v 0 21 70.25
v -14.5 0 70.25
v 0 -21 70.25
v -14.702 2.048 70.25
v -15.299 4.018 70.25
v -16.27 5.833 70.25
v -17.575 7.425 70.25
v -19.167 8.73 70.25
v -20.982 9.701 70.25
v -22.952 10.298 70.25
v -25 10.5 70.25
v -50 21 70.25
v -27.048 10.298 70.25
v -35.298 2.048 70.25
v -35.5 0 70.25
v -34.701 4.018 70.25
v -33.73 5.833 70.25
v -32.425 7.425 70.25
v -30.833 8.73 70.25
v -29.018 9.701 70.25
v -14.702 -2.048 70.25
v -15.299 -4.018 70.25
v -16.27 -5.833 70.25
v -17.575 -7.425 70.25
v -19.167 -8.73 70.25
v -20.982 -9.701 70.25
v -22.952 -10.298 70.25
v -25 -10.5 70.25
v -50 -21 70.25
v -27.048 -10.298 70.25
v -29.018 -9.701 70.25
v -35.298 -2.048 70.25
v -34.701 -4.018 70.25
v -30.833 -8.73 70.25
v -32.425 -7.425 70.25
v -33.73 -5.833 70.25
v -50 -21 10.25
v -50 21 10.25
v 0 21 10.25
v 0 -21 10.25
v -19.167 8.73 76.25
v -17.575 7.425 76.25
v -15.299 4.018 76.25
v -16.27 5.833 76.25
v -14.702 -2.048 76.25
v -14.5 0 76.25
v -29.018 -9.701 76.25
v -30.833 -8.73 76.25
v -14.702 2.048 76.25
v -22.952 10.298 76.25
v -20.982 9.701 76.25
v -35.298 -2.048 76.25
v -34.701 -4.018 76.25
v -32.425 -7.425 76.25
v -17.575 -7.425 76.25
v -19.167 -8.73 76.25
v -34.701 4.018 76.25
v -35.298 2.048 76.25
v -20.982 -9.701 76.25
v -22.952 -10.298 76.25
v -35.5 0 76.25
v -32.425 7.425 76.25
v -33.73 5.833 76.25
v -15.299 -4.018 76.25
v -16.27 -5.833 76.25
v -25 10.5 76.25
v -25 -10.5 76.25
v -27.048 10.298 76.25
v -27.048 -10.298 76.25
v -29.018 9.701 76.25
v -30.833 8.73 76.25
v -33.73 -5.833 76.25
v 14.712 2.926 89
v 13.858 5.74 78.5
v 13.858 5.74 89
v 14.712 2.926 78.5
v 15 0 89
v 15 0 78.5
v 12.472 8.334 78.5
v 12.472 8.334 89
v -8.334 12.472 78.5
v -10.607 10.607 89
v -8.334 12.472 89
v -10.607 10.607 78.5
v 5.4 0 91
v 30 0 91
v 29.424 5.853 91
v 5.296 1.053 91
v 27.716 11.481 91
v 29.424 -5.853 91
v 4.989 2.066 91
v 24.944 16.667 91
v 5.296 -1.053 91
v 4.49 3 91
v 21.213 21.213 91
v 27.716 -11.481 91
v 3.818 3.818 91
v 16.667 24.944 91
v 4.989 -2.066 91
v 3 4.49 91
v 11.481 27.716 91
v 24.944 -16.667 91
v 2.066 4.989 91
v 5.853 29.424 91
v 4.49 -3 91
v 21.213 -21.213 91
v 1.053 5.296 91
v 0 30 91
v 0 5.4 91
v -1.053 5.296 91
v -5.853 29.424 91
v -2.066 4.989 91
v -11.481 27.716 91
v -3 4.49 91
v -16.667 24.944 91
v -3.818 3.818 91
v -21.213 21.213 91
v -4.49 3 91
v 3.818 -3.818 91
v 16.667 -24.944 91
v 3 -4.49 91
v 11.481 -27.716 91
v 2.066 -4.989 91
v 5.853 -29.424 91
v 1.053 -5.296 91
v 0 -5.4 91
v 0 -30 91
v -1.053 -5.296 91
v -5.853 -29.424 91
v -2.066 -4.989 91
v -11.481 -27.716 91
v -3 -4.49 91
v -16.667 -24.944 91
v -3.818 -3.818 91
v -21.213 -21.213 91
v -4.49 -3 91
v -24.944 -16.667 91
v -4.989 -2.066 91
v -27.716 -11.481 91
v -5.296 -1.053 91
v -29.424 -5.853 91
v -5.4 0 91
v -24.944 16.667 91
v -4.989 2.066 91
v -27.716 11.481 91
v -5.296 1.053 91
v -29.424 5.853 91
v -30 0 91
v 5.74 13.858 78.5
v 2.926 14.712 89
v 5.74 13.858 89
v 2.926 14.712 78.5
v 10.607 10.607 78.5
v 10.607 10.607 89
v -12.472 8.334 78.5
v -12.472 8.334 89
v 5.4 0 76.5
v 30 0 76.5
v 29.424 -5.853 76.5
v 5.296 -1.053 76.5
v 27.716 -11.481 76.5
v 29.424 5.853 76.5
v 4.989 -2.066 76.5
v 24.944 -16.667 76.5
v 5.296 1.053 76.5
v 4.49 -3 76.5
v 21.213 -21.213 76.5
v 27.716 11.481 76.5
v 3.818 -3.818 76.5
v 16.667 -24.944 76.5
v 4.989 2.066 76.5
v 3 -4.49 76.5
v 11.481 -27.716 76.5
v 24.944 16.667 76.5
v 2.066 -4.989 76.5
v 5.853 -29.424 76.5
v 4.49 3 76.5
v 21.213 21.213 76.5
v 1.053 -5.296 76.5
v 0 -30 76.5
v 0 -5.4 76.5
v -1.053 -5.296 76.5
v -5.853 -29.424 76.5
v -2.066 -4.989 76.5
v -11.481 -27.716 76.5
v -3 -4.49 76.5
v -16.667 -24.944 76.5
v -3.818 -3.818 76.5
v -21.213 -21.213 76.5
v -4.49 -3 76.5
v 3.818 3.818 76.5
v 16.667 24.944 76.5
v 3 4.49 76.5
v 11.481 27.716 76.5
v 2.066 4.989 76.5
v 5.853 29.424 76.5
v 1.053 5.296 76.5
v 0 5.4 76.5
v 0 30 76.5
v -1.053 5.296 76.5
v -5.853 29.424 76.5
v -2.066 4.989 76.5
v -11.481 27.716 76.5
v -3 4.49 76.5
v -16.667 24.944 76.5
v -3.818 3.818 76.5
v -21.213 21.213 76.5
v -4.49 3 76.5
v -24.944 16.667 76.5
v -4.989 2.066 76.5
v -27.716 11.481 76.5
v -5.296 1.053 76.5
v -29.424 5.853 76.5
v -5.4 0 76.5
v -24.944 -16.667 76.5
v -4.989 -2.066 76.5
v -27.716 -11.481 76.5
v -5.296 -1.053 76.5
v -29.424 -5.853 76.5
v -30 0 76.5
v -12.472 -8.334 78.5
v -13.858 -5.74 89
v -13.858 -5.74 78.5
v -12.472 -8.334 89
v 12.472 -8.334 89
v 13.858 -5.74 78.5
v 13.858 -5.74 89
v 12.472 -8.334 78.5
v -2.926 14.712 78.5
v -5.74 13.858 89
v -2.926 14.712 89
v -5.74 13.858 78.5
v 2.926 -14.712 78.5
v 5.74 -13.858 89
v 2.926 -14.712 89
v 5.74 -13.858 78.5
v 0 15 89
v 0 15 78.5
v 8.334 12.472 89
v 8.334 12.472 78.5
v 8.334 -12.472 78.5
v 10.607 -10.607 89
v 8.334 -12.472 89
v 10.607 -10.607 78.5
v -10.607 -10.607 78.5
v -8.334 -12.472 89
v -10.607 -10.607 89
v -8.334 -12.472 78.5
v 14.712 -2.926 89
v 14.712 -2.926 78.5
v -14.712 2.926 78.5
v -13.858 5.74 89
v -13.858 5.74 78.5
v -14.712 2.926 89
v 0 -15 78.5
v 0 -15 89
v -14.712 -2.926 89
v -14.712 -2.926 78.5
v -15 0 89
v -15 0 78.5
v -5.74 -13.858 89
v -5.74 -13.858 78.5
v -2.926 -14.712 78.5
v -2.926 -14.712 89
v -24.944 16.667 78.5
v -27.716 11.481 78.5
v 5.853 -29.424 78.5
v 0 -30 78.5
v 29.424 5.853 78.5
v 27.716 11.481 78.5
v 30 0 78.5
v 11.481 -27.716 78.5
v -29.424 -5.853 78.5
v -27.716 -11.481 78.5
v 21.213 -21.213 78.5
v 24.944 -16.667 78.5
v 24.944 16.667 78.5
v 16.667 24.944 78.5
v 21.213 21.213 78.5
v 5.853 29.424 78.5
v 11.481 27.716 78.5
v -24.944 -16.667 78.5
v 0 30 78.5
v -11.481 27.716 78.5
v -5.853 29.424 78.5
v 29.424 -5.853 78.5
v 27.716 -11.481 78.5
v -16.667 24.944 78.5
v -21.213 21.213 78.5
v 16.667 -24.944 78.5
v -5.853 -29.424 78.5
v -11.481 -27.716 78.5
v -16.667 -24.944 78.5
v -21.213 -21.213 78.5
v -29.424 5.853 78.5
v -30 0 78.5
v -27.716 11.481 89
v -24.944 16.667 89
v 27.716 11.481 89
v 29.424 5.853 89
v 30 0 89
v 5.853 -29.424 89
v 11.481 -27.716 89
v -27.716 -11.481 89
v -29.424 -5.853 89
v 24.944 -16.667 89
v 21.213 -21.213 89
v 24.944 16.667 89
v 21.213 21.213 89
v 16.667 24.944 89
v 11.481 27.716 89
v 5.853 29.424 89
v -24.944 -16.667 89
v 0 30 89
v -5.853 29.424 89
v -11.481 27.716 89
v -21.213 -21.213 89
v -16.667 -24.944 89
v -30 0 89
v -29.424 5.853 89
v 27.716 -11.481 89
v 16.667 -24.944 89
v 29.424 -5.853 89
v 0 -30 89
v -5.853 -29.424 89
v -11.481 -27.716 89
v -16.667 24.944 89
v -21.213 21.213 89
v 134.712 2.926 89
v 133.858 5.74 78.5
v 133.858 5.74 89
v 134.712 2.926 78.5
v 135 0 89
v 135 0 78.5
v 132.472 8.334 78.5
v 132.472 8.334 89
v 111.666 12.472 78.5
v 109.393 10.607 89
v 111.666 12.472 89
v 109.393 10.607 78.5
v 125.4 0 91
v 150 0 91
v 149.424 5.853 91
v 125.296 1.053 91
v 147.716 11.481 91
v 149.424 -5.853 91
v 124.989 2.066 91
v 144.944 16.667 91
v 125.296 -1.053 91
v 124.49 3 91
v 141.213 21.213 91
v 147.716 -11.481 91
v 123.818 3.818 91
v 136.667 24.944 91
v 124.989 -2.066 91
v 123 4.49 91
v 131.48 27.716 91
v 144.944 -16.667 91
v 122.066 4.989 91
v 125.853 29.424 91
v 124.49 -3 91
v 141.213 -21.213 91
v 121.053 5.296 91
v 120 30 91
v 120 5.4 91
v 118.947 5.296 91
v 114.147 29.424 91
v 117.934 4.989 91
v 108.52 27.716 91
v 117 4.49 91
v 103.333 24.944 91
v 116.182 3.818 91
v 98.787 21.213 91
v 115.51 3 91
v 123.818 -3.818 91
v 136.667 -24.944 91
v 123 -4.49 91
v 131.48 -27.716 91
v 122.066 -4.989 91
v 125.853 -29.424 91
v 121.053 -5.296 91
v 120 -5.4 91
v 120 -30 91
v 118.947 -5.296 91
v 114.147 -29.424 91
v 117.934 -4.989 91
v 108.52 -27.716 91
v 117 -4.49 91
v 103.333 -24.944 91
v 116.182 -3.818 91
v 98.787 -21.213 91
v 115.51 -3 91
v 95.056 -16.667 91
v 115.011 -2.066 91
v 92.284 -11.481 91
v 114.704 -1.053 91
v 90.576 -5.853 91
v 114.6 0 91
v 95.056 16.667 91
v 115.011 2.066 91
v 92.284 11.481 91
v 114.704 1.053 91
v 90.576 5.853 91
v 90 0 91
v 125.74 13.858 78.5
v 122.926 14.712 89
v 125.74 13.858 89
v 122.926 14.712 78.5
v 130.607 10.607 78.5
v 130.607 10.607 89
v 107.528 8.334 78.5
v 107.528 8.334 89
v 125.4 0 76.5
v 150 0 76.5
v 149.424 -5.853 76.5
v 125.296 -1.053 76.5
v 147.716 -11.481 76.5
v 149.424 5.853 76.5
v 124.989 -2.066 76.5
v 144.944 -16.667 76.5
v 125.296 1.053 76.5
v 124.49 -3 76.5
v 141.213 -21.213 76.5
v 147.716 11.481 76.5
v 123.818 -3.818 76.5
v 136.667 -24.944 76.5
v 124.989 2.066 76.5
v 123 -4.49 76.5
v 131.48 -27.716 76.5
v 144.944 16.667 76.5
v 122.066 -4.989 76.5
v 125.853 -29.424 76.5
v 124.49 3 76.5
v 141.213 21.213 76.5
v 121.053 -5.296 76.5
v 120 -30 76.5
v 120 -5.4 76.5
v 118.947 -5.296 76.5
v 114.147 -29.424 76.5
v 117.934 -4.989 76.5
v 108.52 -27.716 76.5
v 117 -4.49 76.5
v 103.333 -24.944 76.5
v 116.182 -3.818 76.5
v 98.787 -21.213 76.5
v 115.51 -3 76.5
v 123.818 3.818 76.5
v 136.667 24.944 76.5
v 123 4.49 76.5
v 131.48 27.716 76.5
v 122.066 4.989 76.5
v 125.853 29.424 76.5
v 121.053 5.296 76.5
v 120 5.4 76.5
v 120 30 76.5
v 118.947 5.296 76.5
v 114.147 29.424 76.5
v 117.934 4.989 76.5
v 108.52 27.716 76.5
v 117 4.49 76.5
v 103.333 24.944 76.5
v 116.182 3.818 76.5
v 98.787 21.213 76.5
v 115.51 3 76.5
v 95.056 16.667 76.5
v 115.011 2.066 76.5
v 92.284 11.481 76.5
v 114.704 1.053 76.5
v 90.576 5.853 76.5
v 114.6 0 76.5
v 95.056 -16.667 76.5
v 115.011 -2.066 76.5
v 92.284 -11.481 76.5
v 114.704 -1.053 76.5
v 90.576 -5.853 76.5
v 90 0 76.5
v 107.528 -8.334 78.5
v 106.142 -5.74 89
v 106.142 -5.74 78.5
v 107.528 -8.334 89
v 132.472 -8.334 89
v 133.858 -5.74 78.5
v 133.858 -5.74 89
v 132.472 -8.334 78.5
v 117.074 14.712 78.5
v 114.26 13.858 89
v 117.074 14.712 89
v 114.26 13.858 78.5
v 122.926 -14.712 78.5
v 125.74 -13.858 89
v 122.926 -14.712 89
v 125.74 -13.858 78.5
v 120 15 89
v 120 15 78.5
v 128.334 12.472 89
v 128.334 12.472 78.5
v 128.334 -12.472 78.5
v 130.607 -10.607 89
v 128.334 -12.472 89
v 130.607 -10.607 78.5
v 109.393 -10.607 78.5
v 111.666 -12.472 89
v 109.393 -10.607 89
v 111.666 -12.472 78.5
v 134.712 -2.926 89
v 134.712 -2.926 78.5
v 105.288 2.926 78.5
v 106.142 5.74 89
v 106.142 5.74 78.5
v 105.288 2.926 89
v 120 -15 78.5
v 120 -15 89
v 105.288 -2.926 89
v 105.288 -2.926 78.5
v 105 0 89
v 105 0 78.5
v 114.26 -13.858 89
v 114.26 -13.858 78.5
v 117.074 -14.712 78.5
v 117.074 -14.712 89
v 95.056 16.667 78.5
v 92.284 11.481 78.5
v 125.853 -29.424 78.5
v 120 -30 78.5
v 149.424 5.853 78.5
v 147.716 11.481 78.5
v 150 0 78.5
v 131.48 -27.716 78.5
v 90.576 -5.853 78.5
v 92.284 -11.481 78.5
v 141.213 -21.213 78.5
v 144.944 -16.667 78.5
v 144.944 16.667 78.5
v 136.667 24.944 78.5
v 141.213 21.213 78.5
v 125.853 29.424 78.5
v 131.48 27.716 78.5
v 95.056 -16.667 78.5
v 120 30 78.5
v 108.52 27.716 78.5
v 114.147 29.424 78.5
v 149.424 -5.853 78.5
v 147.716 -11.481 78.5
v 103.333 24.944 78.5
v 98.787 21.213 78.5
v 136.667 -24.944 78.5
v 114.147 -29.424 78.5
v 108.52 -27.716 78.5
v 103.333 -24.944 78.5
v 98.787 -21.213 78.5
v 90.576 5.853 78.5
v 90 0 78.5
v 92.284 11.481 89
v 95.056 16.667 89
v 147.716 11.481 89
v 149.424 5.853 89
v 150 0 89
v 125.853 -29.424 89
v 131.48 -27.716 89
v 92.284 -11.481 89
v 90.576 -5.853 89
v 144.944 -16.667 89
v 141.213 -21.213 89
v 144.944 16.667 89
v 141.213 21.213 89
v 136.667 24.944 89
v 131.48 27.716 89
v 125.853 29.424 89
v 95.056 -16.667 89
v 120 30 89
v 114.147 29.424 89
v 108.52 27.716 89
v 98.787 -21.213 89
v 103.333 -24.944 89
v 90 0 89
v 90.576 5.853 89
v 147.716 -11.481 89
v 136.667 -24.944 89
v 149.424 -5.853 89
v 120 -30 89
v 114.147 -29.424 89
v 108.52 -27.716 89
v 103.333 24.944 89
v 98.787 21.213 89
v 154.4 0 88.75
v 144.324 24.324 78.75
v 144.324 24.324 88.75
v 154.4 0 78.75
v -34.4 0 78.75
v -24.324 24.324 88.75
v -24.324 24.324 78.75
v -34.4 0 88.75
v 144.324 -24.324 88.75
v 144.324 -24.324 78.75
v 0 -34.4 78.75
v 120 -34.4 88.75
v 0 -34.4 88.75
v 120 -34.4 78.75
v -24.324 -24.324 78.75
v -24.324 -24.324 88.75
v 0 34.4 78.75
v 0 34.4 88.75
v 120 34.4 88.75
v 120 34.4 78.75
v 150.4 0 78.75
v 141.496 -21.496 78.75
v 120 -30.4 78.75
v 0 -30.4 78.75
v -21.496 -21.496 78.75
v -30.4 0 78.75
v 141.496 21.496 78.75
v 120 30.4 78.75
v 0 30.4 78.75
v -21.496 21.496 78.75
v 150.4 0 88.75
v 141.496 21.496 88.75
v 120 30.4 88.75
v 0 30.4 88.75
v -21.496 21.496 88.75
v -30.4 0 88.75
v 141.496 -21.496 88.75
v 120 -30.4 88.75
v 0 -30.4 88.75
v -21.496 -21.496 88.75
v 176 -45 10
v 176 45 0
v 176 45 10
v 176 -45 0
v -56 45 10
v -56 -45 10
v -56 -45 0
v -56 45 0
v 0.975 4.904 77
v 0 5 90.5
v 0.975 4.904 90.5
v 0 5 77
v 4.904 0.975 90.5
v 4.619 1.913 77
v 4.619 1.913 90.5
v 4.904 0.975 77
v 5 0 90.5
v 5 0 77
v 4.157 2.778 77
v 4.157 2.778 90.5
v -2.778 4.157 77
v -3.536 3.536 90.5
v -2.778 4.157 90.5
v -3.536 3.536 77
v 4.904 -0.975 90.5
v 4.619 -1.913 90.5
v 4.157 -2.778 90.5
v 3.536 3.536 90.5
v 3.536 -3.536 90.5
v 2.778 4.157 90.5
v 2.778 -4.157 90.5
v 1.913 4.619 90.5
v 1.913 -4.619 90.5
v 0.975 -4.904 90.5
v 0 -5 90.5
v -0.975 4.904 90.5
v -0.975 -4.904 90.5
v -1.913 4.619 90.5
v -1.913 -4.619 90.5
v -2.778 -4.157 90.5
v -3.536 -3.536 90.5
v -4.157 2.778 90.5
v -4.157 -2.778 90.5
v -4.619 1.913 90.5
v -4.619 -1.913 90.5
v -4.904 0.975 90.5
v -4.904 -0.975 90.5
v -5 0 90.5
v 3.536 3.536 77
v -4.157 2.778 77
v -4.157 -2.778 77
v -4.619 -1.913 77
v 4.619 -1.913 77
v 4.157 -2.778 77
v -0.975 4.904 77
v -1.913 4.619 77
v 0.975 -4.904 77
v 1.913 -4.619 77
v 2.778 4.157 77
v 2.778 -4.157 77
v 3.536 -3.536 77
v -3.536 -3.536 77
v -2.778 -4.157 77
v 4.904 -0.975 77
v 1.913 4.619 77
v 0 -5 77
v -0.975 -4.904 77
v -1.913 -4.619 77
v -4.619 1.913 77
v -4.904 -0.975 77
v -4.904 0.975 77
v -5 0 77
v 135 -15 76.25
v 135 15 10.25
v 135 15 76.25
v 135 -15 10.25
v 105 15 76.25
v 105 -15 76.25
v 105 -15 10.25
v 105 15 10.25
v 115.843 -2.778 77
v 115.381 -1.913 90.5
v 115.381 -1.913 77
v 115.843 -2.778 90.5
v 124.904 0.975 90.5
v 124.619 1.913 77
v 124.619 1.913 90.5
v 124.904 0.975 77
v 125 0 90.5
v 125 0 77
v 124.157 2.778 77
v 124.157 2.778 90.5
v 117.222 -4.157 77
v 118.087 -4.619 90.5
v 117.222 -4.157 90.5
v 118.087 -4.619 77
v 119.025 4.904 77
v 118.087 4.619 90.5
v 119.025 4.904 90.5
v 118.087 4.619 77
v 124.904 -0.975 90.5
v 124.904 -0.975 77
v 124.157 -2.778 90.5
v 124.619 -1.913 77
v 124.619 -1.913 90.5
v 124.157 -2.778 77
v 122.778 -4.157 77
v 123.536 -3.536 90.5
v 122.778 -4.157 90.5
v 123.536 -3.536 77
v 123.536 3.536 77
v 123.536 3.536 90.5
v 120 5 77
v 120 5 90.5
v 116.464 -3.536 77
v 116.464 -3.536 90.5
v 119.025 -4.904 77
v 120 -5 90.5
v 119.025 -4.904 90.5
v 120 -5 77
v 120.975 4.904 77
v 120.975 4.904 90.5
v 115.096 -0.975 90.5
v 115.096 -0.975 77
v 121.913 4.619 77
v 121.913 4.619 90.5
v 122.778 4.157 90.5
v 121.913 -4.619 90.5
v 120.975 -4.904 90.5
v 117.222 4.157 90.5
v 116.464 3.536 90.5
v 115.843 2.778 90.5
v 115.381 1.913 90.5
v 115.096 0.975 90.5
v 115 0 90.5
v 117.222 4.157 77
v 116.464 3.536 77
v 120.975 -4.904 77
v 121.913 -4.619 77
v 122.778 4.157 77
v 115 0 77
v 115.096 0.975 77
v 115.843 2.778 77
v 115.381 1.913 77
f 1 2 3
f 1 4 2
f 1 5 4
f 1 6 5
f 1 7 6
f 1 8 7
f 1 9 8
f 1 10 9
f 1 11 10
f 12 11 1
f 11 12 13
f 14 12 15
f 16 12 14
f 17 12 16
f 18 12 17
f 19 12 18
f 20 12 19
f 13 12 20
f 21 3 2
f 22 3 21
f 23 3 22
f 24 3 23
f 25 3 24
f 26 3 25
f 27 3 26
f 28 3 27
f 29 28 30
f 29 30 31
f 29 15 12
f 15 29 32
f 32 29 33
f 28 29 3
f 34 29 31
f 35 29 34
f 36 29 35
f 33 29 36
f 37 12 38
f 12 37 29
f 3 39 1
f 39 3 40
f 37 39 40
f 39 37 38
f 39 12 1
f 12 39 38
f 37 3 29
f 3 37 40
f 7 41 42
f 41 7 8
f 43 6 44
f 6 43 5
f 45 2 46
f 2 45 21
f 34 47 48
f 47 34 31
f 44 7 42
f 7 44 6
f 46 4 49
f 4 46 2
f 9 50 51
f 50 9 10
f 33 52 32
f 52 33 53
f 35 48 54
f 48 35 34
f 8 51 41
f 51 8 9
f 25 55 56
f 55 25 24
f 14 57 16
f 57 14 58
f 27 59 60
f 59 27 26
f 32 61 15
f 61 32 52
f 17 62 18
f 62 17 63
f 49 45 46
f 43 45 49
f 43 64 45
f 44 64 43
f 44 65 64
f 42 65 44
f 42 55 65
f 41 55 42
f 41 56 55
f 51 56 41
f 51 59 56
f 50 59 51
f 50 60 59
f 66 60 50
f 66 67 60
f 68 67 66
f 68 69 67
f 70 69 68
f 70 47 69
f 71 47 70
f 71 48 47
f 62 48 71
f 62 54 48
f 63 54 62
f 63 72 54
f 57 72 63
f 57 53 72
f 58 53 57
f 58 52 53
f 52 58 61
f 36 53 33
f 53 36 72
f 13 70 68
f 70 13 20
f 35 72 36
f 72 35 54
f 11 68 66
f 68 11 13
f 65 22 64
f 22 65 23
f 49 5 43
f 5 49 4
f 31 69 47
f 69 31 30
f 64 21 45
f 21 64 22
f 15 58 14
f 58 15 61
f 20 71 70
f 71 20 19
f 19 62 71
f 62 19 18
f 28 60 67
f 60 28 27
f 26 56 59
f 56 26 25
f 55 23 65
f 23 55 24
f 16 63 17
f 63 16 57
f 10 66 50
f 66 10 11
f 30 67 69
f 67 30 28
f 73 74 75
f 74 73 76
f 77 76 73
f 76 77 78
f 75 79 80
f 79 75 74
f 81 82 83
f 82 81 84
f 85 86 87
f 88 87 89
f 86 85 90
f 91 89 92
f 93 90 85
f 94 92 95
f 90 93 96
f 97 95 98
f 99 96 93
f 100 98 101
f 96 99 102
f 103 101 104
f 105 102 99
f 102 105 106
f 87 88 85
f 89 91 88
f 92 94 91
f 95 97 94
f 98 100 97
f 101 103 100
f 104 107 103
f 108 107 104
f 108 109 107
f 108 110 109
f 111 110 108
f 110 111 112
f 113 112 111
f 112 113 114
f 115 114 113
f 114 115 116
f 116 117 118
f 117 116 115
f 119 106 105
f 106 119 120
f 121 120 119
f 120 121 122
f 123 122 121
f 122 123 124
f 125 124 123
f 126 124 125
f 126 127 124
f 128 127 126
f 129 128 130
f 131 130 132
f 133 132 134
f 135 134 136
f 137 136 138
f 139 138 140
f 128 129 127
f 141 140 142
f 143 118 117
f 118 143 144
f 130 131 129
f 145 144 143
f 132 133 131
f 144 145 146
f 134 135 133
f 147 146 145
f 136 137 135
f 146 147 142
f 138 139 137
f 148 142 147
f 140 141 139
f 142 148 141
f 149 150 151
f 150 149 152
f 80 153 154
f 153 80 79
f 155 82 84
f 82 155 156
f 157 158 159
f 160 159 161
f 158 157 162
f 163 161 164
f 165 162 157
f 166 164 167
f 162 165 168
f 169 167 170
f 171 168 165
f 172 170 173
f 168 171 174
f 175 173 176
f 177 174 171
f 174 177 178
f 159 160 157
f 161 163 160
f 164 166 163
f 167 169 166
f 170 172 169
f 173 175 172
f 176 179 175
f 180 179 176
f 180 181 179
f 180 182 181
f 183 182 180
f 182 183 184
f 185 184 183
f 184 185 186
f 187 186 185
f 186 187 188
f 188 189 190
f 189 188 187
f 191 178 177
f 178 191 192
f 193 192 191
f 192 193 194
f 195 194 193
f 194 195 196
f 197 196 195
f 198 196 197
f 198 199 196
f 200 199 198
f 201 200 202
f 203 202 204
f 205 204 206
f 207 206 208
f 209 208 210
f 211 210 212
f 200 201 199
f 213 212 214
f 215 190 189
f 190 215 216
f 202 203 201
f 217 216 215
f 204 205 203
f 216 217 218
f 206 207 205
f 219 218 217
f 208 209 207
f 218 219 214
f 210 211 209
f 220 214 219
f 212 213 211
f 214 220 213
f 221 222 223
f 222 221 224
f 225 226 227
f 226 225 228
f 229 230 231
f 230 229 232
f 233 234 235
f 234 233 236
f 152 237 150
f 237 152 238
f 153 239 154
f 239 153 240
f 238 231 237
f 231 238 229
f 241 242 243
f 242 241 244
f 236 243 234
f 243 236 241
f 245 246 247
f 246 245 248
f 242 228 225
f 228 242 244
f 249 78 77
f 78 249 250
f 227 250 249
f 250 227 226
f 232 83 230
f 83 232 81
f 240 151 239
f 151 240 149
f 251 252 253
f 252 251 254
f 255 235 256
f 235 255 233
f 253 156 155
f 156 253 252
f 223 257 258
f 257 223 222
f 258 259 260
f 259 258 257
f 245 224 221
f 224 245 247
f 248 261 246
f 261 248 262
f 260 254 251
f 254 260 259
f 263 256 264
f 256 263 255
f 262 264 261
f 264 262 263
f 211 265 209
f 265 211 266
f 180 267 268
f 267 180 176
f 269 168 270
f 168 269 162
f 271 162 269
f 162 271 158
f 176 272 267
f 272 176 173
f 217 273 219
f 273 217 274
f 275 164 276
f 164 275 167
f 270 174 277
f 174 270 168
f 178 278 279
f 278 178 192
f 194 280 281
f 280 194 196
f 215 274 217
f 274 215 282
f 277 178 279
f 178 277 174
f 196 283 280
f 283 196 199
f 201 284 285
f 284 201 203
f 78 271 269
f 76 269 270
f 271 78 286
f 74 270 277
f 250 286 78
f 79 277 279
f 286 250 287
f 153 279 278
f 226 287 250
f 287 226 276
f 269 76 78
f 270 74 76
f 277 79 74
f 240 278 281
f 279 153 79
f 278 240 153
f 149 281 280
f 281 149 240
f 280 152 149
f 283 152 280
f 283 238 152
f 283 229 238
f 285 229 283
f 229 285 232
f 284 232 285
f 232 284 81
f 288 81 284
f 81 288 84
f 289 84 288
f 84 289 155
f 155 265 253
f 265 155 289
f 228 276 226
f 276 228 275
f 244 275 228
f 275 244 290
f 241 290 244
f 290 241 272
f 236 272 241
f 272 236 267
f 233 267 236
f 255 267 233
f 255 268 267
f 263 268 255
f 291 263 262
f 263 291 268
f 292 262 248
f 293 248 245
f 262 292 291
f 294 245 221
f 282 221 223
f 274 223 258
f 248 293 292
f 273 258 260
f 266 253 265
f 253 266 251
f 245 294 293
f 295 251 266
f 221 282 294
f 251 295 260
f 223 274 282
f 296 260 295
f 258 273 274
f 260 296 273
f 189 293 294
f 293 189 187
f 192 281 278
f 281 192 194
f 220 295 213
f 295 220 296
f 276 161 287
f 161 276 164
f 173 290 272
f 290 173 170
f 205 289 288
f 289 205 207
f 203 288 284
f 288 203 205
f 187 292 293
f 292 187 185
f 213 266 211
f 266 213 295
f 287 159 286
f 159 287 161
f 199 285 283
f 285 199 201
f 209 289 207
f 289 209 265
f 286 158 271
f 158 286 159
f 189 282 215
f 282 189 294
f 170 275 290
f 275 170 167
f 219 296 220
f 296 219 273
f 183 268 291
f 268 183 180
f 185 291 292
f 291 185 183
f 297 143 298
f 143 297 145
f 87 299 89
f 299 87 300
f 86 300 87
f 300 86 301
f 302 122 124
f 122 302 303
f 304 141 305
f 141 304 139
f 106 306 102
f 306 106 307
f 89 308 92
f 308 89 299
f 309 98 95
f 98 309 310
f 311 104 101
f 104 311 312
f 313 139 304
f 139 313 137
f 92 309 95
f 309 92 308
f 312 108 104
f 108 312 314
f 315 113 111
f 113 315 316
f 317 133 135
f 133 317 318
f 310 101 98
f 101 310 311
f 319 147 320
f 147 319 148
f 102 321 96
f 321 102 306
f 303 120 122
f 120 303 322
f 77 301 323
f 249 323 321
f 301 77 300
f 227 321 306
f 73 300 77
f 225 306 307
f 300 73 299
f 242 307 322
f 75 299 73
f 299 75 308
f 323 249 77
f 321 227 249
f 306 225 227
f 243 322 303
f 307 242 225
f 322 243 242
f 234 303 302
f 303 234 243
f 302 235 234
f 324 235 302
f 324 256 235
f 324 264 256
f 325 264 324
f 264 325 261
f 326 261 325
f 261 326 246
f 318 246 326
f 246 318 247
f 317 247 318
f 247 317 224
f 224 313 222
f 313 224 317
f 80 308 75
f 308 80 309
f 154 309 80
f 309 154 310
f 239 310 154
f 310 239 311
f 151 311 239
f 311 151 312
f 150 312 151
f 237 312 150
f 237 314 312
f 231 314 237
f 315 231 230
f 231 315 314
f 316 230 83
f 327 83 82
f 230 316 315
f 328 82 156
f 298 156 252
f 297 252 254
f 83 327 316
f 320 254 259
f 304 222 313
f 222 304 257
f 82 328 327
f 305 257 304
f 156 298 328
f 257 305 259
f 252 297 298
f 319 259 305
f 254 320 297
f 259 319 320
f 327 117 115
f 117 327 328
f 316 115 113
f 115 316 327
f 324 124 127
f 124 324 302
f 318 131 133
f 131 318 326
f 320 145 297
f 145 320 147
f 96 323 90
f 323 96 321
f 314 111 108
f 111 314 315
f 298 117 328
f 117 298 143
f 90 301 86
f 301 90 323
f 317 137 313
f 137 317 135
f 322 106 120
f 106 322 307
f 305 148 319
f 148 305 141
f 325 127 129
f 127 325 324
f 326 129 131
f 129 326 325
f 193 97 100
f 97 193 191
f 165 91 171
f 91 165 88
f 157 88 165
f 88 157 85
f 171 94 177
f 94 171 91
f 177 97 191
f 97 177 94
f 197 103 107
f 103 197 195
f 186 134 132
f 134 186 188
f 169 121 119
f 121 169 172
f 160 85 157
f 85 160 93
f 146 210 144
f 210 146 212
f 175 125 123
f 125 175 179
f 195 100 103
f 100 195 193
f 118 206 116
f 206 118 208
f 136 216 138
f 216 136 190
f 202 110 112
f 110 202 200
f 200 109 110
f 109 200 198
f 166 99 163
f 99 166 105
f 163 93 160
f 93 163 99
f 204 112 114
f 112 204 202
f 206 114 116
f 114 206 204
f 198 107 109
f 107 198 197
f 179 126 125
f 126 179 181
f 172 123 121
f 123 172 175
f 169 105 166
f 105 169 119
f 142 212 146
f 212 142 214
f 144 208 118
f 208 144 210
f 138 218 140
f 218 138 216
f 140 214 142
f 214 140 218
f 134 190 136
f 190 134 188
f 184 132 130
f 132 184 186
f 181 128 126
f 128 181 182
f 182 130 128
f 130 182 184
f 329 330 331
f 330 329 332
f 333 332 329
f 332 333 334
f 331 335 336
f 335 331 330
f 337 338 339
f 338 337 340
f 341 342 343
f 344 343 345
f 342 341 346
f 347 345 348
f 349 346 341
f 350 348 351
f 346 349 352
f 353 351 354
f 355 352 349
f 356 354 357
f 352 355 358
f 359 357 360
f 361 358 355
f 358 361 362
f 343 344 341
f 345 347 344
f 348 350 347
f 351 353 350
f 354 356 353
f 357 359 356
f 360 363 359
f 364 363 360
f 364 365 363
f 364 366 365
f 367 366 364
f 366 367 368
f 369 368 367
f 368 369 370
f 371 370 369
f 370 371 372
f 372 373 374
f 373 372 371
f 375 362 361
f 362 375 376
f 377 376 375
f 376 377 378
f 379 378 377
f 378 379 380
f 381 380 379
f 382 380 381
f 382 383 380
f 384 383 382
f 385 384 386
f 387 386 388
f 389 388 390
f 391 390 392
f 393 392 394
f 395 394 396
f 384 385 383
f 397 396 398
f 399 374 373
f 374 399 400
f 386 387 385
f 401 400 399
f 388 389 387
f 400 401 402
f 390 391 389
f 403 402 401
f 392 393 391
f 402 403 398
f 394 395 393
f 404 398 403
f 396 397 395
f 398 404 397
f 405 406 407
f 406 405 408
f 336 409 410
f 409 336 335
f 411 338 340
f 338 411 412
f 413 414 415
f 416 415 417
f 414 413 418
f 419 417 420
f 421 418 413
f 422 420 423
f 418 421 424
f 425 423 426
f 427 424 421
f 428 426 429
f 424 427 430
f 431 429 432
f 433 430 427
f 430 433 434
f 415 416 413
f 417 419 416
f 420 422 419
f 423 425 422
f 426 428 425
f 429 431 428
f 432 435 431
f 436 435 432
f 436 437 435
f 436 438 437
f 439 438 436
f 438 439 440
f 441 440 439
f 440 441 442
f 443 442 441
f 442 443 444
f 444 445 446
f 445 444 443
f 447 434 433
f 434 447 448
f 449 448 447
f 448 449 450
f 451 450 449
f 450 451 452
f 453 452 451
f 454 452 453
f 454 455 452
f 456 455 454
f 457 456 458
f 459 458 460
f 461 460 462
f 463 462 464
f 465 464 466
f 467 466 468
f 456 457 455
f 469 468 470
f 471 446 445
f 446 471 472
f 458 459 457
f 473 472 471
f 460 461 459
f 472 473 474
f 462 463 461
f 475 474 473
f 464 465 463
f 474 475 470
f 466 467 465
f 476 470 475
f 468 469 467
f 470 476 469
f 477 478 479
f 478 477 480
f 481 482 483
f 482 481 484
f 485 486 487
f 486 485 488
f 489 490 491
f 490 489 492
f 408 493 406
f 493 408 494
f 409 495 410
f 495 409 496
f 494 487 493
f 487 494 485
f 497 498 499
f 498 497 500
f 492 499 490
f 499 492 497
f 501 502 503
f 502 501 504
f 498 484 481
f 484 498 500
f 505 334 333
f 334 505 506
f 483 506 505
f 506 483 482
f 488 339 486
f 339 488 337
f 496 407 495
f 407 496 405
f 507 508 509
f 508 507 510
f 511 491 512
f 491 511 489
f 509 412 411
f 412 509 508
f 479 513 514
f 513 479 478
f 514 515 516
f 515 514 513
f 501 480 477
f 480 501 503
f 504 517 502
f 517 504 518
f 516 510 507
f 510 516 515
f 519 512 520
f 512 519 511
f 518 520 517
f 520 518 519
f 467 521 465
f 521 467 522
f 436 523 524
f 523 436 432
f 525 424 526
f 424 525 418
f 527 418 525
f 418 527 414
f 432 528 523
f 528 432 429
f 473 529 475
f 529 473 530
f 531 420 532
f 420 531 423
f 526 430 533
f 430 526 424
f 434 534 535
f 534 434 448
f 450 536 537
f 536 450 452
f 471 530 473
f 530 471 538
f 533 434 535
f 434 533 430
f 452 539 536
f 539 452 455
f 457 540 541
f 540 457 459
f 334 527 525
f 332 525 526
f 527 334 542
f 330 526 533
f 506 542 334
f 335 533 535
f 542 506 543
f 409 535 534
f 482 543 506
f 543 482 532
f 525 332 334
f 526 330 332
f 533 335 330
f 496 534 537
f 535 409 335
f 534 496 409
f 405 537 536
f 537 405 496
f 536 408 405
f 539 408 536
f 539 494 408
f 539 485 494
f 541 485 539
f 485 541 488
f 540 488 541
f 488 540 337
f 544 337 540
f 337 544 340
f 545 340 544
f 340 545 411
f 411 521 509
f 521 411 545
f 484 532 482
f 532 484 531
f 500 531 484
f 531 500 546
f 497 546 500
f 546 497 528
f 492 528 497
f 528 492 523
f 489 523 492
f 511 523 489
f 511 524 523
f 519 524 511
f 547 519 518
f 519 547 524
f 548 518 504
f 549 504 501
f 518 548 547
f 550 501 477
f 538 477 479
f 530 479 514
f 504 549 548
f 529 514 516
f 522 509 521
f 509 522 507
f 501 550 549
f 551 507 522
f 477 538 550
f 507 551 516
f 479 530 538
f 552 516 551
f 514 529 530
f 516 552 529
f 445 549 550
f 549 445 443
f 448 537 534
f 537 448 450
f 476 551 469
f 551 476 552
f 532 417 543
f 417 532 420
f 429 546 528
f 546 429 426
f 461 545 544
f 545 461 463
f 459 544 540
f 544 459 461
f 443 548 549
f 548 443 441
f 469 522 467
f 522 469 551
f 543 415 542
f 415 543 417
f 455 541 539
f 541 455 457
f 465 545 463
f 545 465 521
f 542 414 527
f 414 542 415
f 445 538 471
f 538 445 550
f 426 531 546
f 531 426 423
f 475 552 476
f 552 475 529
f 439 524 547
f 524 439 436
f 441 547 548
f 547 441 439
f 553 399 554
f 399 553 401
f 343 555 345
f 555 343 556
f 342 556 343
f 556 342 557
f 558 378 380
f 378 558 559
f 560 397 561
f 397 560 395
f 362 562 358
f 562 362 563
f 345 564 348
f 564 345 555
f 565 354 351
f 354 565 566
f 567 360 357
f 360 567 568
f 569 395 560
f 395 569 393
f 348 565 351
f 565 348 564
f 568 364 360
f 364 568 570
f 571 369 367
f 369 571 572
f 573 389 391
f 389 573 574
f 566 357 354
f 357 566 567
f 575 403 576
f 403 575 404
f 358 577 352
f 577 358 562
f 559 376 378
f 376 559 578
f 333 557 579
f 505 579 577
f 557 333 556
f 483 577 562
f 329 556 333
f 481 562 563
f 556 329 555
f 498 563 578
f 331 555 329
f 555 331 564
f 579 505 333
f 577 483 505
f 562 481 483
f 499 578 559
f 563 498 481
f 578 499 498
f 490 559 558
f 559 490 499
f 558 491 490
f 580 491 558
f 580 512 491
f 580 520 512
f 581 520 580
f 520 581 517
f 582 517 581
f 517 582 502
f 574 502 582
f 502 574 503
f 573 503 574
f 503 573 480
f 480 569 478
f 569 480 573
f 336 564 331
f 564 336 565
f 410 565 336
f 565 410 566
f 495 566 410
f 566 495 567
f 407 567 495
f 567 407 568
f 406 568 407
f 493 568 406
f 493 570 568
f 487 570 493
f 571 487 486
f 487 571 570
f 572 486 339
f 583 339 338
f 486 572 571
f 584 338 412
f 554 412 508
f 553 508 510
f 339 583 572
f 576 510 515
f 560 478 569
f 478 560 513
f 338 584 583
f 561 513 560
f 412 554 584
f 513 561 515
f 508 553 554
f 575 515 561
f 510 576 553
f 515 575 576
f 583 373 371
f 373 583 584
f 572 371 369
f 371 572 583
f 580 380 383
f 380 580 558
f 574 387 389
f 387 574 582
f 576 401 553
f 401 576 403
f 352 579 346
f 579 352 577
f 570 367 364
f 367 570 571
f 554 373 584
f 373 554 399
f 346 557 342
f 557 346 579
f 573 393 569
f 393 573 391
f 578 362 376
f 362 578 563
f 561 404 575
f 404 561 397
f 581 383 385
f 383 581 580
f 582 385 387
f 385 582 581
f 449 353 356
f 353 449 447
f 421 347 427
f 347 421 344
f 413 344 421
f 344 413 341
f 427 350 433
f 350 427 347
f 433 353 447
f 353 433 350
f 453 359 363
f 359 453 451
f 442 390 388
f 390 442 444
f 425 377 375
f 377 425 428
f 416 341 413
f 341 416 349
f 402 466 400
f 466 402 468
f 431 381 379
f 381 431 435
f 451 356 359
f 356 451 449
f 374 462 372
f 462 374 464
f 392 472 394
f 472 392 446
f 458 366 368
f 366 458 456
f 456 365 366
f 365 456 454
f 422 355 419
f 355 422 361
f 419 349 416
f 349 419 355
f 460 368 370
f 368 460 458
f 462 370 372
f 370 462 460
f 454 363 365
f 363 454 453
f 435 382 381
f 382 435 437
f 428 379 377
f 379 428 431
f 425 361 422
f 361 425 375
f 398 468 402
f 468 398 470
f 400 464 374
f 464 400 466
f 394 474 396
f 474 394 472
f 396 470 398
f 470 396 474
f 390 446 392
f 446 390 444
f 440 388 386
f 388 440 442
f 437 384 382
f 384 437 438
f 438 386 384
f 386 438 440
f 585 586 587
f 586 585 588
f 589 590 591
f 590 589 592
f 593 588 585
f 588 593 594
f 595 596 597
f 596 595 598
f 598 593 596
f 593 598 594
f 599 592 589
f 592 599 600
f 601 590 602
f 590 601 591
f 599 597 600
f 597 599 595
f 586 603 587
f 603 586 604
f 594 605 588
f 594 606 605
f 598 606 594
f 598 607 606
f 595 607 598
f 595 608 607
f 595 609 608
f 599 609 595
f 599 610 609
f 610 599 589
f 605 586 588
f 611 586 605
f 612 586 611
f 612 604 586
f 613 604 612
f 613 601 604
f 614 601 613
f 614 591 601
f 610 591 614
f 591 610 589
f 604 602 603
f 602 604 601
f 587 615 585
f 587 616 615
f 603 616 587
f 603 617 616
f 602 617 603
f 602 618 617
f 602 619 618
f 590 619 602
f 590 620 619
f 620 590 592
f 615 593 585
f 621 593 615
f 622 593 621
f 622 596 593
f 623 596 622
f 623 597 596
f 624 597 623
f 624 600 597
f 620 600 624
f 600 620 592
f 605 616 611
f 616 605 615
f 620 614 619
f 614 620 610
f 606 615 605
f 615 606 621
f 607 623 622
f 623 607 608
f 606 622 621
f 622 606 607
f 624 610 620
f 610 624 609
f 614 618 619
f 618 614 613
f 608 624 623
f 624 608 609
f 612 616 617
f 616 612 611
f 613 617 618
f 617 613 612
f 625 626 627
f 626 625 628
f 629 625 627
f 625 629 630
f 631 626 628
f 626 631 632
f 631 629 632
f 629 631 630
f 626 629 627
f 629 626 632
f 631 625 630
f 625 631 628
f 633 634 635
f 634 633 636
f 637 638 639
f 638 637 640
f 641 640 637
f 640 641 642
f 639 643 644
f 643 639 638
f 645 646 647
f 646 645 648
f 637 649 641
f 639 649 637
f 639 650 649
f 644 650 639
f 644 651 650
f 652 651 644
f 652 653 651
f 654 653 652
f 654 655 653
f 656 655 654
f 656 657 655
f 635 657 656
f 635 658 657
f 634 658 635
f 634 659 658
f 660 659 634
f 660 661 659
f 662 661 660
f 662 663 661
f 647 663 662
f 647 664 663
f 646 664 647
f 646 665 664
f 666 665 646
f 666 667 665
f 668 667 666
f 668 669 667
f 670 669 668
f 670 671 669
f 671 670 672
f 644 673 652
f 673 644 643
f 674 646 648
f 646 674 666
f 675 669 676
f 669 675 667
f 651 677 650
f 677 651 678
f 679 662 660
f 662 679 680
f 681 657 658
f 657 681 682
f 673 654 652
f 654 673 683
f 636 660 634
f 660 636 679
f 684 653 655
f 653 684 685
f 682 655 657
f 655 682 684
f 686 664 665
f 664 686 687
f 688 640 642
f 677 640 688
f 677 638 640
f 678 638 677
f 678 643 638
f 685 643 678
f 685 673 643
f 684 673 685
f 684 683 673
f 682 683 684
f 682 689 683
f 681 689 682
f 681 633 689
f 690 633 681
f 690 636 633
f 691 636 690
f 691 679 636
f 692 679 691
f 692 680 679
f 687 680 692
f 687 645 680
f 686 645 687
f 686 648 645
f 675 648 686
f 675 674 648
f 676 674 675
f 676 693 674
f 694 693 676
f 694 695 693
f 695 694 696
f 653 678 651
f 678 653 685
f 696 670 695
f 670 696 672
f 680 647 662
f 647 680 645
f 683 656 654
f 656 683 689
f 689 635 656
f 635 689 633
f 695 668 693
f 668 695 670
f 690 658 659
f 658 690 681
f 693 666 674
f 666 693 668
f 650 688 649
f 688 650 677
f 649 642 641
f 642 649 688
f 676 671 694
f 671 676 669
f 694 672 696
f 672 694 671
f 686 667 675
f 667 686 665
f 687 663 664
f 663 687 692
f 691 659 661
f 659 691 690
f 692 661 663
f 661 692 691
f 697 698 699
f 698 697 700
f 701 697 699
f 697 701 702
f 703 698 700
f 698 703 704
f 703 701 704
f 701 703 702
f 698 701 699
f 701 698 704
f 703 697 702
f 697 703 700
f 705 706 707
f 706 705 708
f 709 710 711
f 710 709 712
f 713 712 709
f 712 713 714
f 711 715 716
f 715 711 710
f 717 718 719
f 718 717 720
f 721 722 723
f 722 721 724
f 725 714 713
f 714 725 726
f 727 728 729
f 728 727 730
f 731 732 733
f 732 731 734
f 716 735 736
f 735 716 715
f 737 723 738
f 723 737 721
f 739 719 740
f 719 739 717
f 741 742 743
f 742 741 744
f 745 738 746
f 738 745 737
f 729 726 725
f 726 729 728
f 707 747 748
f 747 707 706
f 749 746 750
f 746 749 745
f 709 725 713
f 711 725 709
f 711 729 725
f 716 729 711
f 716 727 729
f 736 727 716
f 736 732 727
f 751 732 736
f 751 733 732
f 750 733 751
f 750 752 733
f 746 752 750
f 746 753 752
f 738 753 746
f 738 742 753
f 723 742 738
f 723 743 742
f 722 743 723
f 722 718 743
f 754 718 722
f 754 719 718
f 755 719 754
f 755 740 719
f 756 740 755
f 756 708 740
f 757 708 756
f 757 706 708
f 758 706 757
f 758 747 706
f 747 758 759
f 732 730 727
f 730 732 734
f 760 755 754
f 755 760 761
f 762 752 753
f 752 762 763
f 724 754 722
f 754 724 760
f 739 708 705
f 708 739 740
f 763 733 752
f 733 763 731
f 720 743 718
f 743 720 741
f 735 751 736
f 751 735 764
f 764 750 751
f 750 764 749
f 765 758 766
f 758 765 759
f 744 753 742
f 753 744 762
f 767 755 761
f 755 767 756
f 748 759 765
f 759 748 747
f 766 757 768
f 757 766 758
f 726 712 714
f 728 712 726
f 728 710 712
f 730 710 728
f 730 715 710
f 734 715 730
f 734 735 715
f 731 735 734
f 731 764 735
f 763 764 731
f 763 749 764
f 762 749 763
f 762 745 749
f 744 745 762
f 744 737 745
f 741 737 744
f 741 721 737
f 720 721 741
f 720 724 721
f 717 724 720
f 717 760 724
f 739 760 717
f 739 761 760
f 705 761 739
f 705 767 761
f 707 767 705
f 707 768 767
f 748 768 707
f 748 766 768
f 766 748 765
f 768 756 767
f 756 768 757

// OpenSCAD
$fn = 32;

// ------------------------------------------------------------------------
// Motor belt drive: span 120 mm, pulleys d60, belt 10 mm wide
// Every part is its own module, assembly() places every instance.
// ------------------------------------------------------------------------

// --- part 1 ---
module base_plate() {
  difference() {
    translate([-116, -45, 0]) cube([232, 90, 10]);
  }
}

// --- part 2 ---
module motor() {
  union() {
    translate([-30, -21, 0]) cube([60, 42, 50]);
    translate([33, 0, 25]) rotate([0, 90, 0]) cylinder(h = 6, d = 21, center = true);
  }
}

// --- part 3 ---
module drive_shaft() {
  translate([0, 0, -6.75]) cylinder(h = 13.5, d = 10);
}

// --- part 4 ---
module pulley_drive() {
  difference() {
    union() {
      cylinder(h = 14.5, d = 30);
      cylinder(h = 2, d = 60);
      translate([0, 0, 12.5]) cylinder(h = 2, d = 60);
    }
    translate([0, 0, -1]) cylinder(h = 16.5, d = 10.8);
  }
}

// --- part 5 ---
module idler_post() {
  translate([-15, -15, 0]) cube([30, 30, 66]);
}

// --- part 6 ---
module driven_shaft() {
  translate([0, 0, -6.75]) cylinder(h = 13.5, d = 10);
}

// --- part 7 ---
module pulley_driven() {
  difference() {
    union() {
      cylinder(h = 14.5, d = 30);
      cylinder(h = 2, d = 60);
      translate([0, 0, 12.5]) cylinder(h = 2, d = 60);
    }
    translate([0, 0, -1]) cylinder(h = 16.5, d = 10.8);
  }
}

// --- part 8 ---
module drive_belt() {
  difference() {
    linear_extrude(height = 10) polygon(points = concat([for (a = [90 : 45 : 270]) [34.4 * cos(a), 34.4 * sin(a)]], [for (a = [270 : 45 : 450]) [120 + 34.4 * cos(a), 34.4 * sin(a)]]));
    translate([0, 0, -1]) linear_extrude(height = 12) polygon(points = concat([for (a = [90 : 45 : 270]) [30.4 * cos(a), 30.4 * sin(a)]], [for (a = [270 : 45 : 450]) [120 + 30.4 * cos(a), 30.4 * sin(a)]]));
  }
}

// --- assembly ---
module assembly() {
  color([0.80, 0.24, 0.20]) translate([60, 0, 0]) rotate([0, 0, 0]) base_plate();
  color([0.20, 0.45, 0.75]) translate([0, 0, 40.25]) rotate([0, 270, 0]) motor();
  color([0.25, 0.62, 0.32]) translate([0, 0, 83.75]) rotate([0, 0, 0]) drive_shaft();
  color([0.92, 0.70, 0.18]) translate([0, 0, 76.5]) rotate([0, 0, 0]) pulley_drive();
  color([0.58, 0.35, 0.70]) translate([120, 0, 10.25]) rotate([0, 0, 0]) idler_post();
  color([0.16, 0.66, 0.66]) translate([120, 0, 83.75]) rotate([0, 0, 0]) driven_shaft();
  color([0.85, 0.48, 0.18]) translate([120, 0, 76.5]) rotate([0, 0, 0]) pulley_driven();
  color([0.55, 0.60, 0.65]) translate([0, 0, 78.75]) rotate([0, 0, 0]) drive_belt();
}

assembly();
